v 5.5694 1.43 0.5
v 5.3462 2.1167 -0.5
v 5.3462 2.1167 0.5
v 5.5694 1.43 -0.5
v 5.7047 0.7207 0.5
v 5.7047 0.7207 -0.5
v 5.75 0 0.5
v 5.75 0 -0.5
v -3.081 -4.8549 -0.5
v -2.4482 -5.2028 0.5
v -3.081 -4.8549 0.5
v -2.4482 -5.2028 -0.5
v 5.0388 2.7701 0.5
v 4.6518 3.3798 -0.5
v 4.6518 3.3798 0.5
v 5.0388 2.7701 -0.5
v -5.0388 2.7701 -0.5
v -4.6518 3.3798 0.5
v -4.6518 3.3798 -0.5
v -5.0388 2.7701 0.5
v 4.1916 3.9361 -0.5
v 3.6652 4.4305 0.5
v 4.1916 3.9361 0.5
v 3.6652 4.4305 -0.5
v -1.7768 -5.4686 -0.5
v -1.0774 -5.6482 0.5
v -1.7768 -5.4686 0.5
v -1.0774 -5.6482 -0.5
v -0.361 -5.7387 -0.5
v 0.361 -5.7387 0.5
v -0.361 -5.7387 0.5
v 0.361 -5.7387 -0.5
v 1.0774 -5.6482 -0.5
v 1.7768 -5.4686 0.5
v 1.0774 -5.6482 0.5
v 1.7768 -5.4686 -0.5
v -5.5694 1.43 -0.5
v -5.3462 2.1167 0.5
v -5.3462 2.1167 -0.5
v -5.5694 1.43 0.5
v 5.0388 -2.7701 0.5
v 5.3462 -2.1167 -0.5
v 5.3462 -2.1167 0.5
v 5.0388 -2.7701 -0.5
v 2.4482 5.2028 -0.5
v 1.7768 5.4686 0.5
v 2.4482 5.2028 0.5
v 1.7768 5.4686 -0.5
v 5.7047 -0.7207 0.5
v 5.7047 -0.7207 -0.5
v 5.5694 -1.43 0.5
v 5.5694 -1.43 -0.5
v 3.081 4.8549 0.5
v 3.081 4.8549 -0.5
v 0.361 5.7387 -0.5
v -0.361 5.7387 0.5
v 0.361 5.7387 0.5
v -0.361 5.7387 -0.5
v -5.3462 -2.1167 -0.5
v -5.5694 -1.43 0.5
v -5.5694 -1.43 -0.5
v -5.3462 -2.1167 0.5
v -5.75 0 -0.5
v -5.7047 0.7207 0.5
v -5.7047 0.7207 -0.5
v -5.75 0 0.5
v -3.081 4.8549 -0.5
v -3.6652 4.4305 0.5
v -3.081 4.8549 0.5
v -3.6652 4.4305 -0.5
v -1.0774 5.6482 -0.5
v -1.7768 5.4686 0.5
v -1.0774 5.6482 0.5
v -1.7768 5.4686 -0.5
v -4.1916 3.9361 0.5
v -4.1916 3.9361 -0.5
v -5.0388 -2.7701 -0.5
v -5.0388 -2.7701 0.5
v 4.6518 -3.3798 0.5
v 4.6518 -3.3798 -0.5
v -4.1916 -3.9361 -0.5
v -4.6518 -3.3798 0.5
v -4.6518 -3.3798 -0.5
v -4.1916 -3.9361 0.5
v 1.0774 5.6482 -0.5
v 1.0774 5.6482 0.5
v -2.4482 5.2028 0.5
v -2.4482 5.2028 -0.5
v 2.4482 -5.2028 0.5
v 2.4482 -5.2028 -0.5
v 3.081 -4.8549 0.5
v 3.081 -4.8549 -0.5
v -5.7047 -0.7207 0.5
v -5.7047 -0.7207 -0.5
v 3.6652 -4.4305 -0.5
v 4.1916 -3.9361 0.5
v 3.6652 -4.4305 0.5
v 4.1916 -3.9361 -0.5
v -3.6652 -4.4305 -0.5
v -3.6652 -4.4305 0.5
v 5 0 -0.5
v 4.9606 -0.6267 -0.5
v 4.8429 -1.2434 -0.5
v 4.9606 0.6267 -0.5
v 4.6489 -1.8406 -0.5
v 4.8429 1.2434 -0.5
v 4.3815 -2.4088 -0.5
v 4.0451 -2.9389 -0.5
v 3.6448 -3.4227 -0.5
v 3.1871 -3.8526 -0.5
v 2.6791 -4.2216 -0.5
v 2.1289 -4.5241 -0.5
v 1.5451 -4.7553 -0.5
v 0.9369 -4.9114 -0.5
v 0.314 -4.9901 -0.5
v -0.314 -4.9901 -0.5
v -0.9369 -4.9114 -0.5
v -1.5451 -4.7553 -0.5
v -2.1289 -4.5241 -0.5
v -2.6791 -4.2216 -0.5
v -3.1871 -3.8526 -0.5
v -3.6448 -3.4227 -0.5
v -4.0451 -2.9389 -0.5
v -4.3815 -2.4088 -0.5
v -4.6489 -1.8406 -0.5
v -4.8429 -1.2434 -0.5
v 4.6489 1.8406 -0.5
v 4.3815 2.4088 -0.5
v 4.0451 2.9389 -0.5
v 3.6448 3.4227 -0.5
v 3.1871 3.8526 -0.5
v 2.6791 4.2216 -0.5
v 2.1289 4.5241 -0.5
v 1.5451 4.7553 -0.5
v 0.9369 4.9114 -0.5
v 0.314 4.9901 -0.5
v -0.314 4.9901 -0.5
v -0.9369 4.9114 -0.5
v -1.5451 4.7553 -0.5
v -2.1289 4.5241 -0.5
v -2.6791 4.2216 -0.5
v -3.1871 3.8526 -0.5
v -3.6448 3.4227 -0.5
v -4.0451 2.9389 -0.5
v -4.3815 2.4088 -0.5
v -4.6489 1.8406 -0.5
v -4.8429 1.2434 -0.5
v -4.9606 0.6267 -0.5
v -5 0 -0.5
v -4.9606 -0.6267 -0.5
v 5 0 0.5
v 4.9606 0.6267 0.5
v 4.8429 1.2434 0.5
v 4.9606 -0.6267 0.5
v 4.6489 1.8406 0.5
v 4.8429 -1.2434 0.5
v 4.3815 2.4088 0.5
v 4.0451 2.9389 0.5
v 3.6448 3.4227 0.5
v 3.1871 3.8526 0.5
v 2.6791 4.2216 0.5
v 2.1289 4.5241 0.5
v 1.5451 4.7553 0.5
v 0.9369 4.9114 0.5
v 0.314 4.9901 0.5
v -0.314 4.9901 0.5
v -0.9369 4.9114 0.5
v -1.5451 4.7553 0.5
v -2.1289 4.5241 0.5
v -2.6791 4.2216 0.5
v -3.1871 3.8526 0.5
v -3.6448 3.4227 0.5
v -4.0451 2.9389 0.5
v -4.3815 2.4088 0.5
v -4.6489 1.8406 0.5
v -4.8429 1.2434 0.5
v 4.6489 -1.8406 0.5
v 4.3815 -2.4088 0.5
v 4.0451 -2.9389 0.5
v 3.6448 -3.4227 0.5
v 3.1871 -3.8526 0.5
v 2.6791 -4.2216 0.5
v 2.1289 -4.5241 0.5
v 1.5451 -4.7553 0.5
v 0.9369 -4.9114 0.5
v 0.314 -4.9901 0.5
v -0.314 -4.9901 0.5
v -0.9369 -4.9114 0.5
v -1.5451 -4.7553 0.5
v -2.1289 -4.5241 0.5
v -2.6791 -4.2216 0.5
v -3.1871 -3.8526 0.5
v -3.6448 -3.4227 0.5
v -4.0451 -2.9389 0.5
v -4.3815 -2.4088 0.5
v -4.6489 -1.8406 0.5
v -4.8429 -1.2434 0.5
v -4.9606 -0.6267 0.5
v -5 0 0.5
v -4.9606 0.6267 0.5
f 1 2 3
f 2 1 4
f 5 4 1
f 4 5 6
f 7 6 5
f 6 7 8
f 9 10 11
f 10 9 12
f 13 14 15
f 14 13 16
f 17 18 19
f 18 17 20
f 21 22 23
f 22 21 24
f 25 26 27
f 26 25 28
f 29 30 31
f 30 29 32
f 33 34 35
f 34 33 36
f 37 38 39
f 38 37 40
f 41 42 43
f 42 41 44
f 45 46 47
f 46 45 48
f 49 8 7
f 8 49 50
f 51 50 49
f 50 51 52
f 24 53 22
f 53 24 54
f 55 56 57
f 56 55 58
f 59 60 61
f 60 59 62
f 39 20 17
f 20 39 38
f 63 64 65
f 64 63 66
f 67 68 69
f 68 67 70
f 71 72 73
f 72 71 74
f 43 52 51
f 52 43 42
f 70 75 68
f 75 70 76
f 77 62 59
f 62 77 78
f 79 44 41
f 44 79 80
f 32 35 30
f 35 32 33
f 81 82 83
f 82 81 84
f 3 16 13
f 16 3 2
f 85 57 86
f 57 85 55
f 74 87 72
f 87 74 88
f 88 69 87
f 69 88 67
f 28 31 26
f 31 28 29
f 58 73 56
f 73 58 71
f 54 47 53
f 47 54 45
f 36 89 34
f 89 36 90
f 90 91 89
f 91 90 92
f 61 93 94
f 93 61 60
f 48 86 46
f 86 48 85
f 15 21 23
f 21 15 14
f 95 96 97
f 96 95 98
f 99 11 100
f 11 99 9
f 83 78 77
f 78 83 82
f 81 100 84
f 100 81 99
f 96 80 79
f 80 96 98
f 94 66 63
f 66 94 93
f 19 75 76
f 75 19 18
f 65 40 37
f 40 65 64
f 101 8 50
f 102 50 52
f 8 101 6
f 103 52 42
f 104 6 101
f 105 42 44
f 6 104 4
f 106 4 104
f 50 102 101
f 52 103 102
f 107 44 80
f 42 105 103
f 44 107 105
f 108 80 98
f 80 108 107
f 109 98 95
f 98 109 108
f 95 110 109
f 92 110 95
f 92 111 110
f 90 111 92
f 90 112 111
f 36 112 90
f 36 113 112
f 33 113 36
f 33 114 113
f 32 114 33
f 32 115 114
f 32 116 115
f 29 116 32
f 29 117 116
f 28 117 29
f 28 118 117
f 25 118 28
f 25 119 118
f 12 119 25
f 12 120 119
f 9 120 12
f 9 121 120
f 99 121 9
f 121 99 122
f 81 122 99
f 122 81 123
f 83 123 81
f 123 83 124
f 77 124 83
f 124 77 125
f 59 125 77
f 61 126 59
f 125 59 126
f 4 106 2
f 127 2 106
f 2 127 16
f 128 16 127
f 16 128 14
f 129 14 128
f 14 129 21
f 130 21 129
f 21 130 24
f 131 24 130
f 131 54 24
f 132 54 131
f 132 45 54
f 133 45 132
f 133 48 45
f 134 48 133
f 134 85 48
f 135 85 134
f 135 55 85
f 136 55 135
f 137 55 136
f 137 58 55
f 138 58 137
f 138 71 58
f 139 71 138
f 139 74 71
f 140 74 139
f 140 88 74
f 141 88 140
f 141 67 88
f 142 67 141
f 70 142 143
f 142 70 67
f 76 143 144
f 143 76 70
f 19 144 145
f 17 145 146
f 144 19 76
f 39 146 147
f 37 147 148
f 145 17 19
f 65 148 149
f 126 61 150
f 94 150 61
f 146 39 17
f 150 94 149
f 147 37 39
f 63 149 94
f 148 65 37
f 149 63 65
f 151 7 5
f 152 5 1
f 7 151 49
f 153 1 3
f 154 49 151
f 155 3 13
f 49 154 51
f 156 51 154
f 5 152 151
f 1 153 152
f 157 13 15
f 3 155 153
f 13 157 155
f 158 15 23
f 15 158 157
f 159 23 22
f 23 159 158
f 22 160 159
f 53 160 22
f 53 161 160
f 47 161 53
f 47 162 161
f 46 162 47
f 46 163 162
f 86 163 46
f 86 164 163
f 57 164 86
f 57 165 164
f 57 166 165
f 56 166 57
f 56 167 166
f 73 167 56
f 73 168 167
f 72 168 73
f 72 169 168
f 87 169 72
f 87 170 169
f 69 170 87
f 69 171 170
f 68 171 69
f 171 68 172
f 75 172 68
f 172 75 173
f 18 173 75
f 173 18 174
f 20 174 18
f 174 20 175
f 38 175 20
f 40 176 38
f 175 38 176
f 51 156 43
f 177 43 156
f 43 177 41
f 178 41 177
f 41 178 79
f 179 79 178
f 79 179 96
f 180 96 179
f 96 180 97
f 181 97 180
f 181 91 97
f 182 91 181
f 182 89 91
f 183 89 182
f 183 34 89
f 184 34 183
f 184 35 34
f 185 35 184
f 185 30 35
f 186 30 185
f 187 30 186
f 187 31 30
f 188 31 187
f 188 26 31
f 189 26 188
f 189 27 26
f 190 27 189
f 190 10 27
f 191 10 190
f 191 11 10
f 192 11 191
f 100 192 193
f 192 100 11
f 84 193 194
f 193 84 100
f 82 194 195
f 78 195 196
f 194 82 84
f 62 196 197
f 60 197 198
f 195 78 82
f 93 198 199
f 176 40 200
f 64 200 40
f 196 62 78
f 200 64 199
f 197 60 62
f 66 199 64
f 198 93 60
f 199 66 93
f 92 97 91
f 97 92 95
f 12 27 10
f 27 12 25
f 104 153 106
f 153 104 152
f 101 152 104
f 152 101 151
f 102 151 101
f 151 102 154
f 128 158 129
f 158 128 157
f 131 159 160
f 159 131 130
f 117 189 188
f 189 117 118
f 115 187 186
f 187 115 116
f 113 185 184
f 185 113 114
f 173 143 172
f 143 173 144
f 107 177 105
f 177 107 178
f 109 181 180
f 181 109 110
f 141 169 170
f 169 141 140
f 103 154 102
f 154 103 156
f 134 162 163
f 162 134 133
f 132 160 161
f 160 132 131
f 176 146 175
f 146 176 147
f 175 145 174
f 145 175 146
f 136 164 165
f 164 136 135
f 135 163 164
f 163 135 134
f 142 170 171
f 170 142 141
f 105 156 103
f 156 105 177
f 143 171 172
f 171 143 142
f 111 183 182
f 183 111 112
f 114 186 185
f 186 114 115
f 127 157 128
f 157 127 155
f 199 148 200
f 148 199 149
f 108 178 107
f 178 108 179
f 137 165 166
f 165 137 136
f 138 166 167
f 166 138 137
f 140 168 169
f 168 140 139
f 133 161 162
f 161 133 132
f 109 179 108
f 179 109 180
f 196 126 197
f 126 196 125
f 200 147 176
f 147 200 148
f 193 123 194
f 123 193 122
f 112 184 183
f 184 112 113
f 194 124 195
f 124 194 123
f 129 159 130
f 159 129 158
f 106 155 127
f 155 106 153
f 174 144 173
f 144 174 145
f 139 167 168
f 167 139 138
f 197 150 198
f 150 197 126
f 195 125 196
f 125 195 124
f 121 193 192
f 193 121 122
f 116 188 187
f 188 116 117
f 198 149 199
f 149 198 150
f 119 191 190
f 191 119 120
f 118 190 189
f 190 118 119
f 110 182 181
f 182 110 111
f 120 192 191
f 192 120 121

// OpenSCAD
$fn = 50;


difference() {
	union() {
		translate(v = [0, 0, -0.5000000000]) {
			cylinder(h = 1, r = 5.7500000000);
		}
	}
	union() {
		translate(v = [0, 0, -100.0000000000]) {
			cylinder(h = 200, r = 5.0000000000);
		}
	}
}
